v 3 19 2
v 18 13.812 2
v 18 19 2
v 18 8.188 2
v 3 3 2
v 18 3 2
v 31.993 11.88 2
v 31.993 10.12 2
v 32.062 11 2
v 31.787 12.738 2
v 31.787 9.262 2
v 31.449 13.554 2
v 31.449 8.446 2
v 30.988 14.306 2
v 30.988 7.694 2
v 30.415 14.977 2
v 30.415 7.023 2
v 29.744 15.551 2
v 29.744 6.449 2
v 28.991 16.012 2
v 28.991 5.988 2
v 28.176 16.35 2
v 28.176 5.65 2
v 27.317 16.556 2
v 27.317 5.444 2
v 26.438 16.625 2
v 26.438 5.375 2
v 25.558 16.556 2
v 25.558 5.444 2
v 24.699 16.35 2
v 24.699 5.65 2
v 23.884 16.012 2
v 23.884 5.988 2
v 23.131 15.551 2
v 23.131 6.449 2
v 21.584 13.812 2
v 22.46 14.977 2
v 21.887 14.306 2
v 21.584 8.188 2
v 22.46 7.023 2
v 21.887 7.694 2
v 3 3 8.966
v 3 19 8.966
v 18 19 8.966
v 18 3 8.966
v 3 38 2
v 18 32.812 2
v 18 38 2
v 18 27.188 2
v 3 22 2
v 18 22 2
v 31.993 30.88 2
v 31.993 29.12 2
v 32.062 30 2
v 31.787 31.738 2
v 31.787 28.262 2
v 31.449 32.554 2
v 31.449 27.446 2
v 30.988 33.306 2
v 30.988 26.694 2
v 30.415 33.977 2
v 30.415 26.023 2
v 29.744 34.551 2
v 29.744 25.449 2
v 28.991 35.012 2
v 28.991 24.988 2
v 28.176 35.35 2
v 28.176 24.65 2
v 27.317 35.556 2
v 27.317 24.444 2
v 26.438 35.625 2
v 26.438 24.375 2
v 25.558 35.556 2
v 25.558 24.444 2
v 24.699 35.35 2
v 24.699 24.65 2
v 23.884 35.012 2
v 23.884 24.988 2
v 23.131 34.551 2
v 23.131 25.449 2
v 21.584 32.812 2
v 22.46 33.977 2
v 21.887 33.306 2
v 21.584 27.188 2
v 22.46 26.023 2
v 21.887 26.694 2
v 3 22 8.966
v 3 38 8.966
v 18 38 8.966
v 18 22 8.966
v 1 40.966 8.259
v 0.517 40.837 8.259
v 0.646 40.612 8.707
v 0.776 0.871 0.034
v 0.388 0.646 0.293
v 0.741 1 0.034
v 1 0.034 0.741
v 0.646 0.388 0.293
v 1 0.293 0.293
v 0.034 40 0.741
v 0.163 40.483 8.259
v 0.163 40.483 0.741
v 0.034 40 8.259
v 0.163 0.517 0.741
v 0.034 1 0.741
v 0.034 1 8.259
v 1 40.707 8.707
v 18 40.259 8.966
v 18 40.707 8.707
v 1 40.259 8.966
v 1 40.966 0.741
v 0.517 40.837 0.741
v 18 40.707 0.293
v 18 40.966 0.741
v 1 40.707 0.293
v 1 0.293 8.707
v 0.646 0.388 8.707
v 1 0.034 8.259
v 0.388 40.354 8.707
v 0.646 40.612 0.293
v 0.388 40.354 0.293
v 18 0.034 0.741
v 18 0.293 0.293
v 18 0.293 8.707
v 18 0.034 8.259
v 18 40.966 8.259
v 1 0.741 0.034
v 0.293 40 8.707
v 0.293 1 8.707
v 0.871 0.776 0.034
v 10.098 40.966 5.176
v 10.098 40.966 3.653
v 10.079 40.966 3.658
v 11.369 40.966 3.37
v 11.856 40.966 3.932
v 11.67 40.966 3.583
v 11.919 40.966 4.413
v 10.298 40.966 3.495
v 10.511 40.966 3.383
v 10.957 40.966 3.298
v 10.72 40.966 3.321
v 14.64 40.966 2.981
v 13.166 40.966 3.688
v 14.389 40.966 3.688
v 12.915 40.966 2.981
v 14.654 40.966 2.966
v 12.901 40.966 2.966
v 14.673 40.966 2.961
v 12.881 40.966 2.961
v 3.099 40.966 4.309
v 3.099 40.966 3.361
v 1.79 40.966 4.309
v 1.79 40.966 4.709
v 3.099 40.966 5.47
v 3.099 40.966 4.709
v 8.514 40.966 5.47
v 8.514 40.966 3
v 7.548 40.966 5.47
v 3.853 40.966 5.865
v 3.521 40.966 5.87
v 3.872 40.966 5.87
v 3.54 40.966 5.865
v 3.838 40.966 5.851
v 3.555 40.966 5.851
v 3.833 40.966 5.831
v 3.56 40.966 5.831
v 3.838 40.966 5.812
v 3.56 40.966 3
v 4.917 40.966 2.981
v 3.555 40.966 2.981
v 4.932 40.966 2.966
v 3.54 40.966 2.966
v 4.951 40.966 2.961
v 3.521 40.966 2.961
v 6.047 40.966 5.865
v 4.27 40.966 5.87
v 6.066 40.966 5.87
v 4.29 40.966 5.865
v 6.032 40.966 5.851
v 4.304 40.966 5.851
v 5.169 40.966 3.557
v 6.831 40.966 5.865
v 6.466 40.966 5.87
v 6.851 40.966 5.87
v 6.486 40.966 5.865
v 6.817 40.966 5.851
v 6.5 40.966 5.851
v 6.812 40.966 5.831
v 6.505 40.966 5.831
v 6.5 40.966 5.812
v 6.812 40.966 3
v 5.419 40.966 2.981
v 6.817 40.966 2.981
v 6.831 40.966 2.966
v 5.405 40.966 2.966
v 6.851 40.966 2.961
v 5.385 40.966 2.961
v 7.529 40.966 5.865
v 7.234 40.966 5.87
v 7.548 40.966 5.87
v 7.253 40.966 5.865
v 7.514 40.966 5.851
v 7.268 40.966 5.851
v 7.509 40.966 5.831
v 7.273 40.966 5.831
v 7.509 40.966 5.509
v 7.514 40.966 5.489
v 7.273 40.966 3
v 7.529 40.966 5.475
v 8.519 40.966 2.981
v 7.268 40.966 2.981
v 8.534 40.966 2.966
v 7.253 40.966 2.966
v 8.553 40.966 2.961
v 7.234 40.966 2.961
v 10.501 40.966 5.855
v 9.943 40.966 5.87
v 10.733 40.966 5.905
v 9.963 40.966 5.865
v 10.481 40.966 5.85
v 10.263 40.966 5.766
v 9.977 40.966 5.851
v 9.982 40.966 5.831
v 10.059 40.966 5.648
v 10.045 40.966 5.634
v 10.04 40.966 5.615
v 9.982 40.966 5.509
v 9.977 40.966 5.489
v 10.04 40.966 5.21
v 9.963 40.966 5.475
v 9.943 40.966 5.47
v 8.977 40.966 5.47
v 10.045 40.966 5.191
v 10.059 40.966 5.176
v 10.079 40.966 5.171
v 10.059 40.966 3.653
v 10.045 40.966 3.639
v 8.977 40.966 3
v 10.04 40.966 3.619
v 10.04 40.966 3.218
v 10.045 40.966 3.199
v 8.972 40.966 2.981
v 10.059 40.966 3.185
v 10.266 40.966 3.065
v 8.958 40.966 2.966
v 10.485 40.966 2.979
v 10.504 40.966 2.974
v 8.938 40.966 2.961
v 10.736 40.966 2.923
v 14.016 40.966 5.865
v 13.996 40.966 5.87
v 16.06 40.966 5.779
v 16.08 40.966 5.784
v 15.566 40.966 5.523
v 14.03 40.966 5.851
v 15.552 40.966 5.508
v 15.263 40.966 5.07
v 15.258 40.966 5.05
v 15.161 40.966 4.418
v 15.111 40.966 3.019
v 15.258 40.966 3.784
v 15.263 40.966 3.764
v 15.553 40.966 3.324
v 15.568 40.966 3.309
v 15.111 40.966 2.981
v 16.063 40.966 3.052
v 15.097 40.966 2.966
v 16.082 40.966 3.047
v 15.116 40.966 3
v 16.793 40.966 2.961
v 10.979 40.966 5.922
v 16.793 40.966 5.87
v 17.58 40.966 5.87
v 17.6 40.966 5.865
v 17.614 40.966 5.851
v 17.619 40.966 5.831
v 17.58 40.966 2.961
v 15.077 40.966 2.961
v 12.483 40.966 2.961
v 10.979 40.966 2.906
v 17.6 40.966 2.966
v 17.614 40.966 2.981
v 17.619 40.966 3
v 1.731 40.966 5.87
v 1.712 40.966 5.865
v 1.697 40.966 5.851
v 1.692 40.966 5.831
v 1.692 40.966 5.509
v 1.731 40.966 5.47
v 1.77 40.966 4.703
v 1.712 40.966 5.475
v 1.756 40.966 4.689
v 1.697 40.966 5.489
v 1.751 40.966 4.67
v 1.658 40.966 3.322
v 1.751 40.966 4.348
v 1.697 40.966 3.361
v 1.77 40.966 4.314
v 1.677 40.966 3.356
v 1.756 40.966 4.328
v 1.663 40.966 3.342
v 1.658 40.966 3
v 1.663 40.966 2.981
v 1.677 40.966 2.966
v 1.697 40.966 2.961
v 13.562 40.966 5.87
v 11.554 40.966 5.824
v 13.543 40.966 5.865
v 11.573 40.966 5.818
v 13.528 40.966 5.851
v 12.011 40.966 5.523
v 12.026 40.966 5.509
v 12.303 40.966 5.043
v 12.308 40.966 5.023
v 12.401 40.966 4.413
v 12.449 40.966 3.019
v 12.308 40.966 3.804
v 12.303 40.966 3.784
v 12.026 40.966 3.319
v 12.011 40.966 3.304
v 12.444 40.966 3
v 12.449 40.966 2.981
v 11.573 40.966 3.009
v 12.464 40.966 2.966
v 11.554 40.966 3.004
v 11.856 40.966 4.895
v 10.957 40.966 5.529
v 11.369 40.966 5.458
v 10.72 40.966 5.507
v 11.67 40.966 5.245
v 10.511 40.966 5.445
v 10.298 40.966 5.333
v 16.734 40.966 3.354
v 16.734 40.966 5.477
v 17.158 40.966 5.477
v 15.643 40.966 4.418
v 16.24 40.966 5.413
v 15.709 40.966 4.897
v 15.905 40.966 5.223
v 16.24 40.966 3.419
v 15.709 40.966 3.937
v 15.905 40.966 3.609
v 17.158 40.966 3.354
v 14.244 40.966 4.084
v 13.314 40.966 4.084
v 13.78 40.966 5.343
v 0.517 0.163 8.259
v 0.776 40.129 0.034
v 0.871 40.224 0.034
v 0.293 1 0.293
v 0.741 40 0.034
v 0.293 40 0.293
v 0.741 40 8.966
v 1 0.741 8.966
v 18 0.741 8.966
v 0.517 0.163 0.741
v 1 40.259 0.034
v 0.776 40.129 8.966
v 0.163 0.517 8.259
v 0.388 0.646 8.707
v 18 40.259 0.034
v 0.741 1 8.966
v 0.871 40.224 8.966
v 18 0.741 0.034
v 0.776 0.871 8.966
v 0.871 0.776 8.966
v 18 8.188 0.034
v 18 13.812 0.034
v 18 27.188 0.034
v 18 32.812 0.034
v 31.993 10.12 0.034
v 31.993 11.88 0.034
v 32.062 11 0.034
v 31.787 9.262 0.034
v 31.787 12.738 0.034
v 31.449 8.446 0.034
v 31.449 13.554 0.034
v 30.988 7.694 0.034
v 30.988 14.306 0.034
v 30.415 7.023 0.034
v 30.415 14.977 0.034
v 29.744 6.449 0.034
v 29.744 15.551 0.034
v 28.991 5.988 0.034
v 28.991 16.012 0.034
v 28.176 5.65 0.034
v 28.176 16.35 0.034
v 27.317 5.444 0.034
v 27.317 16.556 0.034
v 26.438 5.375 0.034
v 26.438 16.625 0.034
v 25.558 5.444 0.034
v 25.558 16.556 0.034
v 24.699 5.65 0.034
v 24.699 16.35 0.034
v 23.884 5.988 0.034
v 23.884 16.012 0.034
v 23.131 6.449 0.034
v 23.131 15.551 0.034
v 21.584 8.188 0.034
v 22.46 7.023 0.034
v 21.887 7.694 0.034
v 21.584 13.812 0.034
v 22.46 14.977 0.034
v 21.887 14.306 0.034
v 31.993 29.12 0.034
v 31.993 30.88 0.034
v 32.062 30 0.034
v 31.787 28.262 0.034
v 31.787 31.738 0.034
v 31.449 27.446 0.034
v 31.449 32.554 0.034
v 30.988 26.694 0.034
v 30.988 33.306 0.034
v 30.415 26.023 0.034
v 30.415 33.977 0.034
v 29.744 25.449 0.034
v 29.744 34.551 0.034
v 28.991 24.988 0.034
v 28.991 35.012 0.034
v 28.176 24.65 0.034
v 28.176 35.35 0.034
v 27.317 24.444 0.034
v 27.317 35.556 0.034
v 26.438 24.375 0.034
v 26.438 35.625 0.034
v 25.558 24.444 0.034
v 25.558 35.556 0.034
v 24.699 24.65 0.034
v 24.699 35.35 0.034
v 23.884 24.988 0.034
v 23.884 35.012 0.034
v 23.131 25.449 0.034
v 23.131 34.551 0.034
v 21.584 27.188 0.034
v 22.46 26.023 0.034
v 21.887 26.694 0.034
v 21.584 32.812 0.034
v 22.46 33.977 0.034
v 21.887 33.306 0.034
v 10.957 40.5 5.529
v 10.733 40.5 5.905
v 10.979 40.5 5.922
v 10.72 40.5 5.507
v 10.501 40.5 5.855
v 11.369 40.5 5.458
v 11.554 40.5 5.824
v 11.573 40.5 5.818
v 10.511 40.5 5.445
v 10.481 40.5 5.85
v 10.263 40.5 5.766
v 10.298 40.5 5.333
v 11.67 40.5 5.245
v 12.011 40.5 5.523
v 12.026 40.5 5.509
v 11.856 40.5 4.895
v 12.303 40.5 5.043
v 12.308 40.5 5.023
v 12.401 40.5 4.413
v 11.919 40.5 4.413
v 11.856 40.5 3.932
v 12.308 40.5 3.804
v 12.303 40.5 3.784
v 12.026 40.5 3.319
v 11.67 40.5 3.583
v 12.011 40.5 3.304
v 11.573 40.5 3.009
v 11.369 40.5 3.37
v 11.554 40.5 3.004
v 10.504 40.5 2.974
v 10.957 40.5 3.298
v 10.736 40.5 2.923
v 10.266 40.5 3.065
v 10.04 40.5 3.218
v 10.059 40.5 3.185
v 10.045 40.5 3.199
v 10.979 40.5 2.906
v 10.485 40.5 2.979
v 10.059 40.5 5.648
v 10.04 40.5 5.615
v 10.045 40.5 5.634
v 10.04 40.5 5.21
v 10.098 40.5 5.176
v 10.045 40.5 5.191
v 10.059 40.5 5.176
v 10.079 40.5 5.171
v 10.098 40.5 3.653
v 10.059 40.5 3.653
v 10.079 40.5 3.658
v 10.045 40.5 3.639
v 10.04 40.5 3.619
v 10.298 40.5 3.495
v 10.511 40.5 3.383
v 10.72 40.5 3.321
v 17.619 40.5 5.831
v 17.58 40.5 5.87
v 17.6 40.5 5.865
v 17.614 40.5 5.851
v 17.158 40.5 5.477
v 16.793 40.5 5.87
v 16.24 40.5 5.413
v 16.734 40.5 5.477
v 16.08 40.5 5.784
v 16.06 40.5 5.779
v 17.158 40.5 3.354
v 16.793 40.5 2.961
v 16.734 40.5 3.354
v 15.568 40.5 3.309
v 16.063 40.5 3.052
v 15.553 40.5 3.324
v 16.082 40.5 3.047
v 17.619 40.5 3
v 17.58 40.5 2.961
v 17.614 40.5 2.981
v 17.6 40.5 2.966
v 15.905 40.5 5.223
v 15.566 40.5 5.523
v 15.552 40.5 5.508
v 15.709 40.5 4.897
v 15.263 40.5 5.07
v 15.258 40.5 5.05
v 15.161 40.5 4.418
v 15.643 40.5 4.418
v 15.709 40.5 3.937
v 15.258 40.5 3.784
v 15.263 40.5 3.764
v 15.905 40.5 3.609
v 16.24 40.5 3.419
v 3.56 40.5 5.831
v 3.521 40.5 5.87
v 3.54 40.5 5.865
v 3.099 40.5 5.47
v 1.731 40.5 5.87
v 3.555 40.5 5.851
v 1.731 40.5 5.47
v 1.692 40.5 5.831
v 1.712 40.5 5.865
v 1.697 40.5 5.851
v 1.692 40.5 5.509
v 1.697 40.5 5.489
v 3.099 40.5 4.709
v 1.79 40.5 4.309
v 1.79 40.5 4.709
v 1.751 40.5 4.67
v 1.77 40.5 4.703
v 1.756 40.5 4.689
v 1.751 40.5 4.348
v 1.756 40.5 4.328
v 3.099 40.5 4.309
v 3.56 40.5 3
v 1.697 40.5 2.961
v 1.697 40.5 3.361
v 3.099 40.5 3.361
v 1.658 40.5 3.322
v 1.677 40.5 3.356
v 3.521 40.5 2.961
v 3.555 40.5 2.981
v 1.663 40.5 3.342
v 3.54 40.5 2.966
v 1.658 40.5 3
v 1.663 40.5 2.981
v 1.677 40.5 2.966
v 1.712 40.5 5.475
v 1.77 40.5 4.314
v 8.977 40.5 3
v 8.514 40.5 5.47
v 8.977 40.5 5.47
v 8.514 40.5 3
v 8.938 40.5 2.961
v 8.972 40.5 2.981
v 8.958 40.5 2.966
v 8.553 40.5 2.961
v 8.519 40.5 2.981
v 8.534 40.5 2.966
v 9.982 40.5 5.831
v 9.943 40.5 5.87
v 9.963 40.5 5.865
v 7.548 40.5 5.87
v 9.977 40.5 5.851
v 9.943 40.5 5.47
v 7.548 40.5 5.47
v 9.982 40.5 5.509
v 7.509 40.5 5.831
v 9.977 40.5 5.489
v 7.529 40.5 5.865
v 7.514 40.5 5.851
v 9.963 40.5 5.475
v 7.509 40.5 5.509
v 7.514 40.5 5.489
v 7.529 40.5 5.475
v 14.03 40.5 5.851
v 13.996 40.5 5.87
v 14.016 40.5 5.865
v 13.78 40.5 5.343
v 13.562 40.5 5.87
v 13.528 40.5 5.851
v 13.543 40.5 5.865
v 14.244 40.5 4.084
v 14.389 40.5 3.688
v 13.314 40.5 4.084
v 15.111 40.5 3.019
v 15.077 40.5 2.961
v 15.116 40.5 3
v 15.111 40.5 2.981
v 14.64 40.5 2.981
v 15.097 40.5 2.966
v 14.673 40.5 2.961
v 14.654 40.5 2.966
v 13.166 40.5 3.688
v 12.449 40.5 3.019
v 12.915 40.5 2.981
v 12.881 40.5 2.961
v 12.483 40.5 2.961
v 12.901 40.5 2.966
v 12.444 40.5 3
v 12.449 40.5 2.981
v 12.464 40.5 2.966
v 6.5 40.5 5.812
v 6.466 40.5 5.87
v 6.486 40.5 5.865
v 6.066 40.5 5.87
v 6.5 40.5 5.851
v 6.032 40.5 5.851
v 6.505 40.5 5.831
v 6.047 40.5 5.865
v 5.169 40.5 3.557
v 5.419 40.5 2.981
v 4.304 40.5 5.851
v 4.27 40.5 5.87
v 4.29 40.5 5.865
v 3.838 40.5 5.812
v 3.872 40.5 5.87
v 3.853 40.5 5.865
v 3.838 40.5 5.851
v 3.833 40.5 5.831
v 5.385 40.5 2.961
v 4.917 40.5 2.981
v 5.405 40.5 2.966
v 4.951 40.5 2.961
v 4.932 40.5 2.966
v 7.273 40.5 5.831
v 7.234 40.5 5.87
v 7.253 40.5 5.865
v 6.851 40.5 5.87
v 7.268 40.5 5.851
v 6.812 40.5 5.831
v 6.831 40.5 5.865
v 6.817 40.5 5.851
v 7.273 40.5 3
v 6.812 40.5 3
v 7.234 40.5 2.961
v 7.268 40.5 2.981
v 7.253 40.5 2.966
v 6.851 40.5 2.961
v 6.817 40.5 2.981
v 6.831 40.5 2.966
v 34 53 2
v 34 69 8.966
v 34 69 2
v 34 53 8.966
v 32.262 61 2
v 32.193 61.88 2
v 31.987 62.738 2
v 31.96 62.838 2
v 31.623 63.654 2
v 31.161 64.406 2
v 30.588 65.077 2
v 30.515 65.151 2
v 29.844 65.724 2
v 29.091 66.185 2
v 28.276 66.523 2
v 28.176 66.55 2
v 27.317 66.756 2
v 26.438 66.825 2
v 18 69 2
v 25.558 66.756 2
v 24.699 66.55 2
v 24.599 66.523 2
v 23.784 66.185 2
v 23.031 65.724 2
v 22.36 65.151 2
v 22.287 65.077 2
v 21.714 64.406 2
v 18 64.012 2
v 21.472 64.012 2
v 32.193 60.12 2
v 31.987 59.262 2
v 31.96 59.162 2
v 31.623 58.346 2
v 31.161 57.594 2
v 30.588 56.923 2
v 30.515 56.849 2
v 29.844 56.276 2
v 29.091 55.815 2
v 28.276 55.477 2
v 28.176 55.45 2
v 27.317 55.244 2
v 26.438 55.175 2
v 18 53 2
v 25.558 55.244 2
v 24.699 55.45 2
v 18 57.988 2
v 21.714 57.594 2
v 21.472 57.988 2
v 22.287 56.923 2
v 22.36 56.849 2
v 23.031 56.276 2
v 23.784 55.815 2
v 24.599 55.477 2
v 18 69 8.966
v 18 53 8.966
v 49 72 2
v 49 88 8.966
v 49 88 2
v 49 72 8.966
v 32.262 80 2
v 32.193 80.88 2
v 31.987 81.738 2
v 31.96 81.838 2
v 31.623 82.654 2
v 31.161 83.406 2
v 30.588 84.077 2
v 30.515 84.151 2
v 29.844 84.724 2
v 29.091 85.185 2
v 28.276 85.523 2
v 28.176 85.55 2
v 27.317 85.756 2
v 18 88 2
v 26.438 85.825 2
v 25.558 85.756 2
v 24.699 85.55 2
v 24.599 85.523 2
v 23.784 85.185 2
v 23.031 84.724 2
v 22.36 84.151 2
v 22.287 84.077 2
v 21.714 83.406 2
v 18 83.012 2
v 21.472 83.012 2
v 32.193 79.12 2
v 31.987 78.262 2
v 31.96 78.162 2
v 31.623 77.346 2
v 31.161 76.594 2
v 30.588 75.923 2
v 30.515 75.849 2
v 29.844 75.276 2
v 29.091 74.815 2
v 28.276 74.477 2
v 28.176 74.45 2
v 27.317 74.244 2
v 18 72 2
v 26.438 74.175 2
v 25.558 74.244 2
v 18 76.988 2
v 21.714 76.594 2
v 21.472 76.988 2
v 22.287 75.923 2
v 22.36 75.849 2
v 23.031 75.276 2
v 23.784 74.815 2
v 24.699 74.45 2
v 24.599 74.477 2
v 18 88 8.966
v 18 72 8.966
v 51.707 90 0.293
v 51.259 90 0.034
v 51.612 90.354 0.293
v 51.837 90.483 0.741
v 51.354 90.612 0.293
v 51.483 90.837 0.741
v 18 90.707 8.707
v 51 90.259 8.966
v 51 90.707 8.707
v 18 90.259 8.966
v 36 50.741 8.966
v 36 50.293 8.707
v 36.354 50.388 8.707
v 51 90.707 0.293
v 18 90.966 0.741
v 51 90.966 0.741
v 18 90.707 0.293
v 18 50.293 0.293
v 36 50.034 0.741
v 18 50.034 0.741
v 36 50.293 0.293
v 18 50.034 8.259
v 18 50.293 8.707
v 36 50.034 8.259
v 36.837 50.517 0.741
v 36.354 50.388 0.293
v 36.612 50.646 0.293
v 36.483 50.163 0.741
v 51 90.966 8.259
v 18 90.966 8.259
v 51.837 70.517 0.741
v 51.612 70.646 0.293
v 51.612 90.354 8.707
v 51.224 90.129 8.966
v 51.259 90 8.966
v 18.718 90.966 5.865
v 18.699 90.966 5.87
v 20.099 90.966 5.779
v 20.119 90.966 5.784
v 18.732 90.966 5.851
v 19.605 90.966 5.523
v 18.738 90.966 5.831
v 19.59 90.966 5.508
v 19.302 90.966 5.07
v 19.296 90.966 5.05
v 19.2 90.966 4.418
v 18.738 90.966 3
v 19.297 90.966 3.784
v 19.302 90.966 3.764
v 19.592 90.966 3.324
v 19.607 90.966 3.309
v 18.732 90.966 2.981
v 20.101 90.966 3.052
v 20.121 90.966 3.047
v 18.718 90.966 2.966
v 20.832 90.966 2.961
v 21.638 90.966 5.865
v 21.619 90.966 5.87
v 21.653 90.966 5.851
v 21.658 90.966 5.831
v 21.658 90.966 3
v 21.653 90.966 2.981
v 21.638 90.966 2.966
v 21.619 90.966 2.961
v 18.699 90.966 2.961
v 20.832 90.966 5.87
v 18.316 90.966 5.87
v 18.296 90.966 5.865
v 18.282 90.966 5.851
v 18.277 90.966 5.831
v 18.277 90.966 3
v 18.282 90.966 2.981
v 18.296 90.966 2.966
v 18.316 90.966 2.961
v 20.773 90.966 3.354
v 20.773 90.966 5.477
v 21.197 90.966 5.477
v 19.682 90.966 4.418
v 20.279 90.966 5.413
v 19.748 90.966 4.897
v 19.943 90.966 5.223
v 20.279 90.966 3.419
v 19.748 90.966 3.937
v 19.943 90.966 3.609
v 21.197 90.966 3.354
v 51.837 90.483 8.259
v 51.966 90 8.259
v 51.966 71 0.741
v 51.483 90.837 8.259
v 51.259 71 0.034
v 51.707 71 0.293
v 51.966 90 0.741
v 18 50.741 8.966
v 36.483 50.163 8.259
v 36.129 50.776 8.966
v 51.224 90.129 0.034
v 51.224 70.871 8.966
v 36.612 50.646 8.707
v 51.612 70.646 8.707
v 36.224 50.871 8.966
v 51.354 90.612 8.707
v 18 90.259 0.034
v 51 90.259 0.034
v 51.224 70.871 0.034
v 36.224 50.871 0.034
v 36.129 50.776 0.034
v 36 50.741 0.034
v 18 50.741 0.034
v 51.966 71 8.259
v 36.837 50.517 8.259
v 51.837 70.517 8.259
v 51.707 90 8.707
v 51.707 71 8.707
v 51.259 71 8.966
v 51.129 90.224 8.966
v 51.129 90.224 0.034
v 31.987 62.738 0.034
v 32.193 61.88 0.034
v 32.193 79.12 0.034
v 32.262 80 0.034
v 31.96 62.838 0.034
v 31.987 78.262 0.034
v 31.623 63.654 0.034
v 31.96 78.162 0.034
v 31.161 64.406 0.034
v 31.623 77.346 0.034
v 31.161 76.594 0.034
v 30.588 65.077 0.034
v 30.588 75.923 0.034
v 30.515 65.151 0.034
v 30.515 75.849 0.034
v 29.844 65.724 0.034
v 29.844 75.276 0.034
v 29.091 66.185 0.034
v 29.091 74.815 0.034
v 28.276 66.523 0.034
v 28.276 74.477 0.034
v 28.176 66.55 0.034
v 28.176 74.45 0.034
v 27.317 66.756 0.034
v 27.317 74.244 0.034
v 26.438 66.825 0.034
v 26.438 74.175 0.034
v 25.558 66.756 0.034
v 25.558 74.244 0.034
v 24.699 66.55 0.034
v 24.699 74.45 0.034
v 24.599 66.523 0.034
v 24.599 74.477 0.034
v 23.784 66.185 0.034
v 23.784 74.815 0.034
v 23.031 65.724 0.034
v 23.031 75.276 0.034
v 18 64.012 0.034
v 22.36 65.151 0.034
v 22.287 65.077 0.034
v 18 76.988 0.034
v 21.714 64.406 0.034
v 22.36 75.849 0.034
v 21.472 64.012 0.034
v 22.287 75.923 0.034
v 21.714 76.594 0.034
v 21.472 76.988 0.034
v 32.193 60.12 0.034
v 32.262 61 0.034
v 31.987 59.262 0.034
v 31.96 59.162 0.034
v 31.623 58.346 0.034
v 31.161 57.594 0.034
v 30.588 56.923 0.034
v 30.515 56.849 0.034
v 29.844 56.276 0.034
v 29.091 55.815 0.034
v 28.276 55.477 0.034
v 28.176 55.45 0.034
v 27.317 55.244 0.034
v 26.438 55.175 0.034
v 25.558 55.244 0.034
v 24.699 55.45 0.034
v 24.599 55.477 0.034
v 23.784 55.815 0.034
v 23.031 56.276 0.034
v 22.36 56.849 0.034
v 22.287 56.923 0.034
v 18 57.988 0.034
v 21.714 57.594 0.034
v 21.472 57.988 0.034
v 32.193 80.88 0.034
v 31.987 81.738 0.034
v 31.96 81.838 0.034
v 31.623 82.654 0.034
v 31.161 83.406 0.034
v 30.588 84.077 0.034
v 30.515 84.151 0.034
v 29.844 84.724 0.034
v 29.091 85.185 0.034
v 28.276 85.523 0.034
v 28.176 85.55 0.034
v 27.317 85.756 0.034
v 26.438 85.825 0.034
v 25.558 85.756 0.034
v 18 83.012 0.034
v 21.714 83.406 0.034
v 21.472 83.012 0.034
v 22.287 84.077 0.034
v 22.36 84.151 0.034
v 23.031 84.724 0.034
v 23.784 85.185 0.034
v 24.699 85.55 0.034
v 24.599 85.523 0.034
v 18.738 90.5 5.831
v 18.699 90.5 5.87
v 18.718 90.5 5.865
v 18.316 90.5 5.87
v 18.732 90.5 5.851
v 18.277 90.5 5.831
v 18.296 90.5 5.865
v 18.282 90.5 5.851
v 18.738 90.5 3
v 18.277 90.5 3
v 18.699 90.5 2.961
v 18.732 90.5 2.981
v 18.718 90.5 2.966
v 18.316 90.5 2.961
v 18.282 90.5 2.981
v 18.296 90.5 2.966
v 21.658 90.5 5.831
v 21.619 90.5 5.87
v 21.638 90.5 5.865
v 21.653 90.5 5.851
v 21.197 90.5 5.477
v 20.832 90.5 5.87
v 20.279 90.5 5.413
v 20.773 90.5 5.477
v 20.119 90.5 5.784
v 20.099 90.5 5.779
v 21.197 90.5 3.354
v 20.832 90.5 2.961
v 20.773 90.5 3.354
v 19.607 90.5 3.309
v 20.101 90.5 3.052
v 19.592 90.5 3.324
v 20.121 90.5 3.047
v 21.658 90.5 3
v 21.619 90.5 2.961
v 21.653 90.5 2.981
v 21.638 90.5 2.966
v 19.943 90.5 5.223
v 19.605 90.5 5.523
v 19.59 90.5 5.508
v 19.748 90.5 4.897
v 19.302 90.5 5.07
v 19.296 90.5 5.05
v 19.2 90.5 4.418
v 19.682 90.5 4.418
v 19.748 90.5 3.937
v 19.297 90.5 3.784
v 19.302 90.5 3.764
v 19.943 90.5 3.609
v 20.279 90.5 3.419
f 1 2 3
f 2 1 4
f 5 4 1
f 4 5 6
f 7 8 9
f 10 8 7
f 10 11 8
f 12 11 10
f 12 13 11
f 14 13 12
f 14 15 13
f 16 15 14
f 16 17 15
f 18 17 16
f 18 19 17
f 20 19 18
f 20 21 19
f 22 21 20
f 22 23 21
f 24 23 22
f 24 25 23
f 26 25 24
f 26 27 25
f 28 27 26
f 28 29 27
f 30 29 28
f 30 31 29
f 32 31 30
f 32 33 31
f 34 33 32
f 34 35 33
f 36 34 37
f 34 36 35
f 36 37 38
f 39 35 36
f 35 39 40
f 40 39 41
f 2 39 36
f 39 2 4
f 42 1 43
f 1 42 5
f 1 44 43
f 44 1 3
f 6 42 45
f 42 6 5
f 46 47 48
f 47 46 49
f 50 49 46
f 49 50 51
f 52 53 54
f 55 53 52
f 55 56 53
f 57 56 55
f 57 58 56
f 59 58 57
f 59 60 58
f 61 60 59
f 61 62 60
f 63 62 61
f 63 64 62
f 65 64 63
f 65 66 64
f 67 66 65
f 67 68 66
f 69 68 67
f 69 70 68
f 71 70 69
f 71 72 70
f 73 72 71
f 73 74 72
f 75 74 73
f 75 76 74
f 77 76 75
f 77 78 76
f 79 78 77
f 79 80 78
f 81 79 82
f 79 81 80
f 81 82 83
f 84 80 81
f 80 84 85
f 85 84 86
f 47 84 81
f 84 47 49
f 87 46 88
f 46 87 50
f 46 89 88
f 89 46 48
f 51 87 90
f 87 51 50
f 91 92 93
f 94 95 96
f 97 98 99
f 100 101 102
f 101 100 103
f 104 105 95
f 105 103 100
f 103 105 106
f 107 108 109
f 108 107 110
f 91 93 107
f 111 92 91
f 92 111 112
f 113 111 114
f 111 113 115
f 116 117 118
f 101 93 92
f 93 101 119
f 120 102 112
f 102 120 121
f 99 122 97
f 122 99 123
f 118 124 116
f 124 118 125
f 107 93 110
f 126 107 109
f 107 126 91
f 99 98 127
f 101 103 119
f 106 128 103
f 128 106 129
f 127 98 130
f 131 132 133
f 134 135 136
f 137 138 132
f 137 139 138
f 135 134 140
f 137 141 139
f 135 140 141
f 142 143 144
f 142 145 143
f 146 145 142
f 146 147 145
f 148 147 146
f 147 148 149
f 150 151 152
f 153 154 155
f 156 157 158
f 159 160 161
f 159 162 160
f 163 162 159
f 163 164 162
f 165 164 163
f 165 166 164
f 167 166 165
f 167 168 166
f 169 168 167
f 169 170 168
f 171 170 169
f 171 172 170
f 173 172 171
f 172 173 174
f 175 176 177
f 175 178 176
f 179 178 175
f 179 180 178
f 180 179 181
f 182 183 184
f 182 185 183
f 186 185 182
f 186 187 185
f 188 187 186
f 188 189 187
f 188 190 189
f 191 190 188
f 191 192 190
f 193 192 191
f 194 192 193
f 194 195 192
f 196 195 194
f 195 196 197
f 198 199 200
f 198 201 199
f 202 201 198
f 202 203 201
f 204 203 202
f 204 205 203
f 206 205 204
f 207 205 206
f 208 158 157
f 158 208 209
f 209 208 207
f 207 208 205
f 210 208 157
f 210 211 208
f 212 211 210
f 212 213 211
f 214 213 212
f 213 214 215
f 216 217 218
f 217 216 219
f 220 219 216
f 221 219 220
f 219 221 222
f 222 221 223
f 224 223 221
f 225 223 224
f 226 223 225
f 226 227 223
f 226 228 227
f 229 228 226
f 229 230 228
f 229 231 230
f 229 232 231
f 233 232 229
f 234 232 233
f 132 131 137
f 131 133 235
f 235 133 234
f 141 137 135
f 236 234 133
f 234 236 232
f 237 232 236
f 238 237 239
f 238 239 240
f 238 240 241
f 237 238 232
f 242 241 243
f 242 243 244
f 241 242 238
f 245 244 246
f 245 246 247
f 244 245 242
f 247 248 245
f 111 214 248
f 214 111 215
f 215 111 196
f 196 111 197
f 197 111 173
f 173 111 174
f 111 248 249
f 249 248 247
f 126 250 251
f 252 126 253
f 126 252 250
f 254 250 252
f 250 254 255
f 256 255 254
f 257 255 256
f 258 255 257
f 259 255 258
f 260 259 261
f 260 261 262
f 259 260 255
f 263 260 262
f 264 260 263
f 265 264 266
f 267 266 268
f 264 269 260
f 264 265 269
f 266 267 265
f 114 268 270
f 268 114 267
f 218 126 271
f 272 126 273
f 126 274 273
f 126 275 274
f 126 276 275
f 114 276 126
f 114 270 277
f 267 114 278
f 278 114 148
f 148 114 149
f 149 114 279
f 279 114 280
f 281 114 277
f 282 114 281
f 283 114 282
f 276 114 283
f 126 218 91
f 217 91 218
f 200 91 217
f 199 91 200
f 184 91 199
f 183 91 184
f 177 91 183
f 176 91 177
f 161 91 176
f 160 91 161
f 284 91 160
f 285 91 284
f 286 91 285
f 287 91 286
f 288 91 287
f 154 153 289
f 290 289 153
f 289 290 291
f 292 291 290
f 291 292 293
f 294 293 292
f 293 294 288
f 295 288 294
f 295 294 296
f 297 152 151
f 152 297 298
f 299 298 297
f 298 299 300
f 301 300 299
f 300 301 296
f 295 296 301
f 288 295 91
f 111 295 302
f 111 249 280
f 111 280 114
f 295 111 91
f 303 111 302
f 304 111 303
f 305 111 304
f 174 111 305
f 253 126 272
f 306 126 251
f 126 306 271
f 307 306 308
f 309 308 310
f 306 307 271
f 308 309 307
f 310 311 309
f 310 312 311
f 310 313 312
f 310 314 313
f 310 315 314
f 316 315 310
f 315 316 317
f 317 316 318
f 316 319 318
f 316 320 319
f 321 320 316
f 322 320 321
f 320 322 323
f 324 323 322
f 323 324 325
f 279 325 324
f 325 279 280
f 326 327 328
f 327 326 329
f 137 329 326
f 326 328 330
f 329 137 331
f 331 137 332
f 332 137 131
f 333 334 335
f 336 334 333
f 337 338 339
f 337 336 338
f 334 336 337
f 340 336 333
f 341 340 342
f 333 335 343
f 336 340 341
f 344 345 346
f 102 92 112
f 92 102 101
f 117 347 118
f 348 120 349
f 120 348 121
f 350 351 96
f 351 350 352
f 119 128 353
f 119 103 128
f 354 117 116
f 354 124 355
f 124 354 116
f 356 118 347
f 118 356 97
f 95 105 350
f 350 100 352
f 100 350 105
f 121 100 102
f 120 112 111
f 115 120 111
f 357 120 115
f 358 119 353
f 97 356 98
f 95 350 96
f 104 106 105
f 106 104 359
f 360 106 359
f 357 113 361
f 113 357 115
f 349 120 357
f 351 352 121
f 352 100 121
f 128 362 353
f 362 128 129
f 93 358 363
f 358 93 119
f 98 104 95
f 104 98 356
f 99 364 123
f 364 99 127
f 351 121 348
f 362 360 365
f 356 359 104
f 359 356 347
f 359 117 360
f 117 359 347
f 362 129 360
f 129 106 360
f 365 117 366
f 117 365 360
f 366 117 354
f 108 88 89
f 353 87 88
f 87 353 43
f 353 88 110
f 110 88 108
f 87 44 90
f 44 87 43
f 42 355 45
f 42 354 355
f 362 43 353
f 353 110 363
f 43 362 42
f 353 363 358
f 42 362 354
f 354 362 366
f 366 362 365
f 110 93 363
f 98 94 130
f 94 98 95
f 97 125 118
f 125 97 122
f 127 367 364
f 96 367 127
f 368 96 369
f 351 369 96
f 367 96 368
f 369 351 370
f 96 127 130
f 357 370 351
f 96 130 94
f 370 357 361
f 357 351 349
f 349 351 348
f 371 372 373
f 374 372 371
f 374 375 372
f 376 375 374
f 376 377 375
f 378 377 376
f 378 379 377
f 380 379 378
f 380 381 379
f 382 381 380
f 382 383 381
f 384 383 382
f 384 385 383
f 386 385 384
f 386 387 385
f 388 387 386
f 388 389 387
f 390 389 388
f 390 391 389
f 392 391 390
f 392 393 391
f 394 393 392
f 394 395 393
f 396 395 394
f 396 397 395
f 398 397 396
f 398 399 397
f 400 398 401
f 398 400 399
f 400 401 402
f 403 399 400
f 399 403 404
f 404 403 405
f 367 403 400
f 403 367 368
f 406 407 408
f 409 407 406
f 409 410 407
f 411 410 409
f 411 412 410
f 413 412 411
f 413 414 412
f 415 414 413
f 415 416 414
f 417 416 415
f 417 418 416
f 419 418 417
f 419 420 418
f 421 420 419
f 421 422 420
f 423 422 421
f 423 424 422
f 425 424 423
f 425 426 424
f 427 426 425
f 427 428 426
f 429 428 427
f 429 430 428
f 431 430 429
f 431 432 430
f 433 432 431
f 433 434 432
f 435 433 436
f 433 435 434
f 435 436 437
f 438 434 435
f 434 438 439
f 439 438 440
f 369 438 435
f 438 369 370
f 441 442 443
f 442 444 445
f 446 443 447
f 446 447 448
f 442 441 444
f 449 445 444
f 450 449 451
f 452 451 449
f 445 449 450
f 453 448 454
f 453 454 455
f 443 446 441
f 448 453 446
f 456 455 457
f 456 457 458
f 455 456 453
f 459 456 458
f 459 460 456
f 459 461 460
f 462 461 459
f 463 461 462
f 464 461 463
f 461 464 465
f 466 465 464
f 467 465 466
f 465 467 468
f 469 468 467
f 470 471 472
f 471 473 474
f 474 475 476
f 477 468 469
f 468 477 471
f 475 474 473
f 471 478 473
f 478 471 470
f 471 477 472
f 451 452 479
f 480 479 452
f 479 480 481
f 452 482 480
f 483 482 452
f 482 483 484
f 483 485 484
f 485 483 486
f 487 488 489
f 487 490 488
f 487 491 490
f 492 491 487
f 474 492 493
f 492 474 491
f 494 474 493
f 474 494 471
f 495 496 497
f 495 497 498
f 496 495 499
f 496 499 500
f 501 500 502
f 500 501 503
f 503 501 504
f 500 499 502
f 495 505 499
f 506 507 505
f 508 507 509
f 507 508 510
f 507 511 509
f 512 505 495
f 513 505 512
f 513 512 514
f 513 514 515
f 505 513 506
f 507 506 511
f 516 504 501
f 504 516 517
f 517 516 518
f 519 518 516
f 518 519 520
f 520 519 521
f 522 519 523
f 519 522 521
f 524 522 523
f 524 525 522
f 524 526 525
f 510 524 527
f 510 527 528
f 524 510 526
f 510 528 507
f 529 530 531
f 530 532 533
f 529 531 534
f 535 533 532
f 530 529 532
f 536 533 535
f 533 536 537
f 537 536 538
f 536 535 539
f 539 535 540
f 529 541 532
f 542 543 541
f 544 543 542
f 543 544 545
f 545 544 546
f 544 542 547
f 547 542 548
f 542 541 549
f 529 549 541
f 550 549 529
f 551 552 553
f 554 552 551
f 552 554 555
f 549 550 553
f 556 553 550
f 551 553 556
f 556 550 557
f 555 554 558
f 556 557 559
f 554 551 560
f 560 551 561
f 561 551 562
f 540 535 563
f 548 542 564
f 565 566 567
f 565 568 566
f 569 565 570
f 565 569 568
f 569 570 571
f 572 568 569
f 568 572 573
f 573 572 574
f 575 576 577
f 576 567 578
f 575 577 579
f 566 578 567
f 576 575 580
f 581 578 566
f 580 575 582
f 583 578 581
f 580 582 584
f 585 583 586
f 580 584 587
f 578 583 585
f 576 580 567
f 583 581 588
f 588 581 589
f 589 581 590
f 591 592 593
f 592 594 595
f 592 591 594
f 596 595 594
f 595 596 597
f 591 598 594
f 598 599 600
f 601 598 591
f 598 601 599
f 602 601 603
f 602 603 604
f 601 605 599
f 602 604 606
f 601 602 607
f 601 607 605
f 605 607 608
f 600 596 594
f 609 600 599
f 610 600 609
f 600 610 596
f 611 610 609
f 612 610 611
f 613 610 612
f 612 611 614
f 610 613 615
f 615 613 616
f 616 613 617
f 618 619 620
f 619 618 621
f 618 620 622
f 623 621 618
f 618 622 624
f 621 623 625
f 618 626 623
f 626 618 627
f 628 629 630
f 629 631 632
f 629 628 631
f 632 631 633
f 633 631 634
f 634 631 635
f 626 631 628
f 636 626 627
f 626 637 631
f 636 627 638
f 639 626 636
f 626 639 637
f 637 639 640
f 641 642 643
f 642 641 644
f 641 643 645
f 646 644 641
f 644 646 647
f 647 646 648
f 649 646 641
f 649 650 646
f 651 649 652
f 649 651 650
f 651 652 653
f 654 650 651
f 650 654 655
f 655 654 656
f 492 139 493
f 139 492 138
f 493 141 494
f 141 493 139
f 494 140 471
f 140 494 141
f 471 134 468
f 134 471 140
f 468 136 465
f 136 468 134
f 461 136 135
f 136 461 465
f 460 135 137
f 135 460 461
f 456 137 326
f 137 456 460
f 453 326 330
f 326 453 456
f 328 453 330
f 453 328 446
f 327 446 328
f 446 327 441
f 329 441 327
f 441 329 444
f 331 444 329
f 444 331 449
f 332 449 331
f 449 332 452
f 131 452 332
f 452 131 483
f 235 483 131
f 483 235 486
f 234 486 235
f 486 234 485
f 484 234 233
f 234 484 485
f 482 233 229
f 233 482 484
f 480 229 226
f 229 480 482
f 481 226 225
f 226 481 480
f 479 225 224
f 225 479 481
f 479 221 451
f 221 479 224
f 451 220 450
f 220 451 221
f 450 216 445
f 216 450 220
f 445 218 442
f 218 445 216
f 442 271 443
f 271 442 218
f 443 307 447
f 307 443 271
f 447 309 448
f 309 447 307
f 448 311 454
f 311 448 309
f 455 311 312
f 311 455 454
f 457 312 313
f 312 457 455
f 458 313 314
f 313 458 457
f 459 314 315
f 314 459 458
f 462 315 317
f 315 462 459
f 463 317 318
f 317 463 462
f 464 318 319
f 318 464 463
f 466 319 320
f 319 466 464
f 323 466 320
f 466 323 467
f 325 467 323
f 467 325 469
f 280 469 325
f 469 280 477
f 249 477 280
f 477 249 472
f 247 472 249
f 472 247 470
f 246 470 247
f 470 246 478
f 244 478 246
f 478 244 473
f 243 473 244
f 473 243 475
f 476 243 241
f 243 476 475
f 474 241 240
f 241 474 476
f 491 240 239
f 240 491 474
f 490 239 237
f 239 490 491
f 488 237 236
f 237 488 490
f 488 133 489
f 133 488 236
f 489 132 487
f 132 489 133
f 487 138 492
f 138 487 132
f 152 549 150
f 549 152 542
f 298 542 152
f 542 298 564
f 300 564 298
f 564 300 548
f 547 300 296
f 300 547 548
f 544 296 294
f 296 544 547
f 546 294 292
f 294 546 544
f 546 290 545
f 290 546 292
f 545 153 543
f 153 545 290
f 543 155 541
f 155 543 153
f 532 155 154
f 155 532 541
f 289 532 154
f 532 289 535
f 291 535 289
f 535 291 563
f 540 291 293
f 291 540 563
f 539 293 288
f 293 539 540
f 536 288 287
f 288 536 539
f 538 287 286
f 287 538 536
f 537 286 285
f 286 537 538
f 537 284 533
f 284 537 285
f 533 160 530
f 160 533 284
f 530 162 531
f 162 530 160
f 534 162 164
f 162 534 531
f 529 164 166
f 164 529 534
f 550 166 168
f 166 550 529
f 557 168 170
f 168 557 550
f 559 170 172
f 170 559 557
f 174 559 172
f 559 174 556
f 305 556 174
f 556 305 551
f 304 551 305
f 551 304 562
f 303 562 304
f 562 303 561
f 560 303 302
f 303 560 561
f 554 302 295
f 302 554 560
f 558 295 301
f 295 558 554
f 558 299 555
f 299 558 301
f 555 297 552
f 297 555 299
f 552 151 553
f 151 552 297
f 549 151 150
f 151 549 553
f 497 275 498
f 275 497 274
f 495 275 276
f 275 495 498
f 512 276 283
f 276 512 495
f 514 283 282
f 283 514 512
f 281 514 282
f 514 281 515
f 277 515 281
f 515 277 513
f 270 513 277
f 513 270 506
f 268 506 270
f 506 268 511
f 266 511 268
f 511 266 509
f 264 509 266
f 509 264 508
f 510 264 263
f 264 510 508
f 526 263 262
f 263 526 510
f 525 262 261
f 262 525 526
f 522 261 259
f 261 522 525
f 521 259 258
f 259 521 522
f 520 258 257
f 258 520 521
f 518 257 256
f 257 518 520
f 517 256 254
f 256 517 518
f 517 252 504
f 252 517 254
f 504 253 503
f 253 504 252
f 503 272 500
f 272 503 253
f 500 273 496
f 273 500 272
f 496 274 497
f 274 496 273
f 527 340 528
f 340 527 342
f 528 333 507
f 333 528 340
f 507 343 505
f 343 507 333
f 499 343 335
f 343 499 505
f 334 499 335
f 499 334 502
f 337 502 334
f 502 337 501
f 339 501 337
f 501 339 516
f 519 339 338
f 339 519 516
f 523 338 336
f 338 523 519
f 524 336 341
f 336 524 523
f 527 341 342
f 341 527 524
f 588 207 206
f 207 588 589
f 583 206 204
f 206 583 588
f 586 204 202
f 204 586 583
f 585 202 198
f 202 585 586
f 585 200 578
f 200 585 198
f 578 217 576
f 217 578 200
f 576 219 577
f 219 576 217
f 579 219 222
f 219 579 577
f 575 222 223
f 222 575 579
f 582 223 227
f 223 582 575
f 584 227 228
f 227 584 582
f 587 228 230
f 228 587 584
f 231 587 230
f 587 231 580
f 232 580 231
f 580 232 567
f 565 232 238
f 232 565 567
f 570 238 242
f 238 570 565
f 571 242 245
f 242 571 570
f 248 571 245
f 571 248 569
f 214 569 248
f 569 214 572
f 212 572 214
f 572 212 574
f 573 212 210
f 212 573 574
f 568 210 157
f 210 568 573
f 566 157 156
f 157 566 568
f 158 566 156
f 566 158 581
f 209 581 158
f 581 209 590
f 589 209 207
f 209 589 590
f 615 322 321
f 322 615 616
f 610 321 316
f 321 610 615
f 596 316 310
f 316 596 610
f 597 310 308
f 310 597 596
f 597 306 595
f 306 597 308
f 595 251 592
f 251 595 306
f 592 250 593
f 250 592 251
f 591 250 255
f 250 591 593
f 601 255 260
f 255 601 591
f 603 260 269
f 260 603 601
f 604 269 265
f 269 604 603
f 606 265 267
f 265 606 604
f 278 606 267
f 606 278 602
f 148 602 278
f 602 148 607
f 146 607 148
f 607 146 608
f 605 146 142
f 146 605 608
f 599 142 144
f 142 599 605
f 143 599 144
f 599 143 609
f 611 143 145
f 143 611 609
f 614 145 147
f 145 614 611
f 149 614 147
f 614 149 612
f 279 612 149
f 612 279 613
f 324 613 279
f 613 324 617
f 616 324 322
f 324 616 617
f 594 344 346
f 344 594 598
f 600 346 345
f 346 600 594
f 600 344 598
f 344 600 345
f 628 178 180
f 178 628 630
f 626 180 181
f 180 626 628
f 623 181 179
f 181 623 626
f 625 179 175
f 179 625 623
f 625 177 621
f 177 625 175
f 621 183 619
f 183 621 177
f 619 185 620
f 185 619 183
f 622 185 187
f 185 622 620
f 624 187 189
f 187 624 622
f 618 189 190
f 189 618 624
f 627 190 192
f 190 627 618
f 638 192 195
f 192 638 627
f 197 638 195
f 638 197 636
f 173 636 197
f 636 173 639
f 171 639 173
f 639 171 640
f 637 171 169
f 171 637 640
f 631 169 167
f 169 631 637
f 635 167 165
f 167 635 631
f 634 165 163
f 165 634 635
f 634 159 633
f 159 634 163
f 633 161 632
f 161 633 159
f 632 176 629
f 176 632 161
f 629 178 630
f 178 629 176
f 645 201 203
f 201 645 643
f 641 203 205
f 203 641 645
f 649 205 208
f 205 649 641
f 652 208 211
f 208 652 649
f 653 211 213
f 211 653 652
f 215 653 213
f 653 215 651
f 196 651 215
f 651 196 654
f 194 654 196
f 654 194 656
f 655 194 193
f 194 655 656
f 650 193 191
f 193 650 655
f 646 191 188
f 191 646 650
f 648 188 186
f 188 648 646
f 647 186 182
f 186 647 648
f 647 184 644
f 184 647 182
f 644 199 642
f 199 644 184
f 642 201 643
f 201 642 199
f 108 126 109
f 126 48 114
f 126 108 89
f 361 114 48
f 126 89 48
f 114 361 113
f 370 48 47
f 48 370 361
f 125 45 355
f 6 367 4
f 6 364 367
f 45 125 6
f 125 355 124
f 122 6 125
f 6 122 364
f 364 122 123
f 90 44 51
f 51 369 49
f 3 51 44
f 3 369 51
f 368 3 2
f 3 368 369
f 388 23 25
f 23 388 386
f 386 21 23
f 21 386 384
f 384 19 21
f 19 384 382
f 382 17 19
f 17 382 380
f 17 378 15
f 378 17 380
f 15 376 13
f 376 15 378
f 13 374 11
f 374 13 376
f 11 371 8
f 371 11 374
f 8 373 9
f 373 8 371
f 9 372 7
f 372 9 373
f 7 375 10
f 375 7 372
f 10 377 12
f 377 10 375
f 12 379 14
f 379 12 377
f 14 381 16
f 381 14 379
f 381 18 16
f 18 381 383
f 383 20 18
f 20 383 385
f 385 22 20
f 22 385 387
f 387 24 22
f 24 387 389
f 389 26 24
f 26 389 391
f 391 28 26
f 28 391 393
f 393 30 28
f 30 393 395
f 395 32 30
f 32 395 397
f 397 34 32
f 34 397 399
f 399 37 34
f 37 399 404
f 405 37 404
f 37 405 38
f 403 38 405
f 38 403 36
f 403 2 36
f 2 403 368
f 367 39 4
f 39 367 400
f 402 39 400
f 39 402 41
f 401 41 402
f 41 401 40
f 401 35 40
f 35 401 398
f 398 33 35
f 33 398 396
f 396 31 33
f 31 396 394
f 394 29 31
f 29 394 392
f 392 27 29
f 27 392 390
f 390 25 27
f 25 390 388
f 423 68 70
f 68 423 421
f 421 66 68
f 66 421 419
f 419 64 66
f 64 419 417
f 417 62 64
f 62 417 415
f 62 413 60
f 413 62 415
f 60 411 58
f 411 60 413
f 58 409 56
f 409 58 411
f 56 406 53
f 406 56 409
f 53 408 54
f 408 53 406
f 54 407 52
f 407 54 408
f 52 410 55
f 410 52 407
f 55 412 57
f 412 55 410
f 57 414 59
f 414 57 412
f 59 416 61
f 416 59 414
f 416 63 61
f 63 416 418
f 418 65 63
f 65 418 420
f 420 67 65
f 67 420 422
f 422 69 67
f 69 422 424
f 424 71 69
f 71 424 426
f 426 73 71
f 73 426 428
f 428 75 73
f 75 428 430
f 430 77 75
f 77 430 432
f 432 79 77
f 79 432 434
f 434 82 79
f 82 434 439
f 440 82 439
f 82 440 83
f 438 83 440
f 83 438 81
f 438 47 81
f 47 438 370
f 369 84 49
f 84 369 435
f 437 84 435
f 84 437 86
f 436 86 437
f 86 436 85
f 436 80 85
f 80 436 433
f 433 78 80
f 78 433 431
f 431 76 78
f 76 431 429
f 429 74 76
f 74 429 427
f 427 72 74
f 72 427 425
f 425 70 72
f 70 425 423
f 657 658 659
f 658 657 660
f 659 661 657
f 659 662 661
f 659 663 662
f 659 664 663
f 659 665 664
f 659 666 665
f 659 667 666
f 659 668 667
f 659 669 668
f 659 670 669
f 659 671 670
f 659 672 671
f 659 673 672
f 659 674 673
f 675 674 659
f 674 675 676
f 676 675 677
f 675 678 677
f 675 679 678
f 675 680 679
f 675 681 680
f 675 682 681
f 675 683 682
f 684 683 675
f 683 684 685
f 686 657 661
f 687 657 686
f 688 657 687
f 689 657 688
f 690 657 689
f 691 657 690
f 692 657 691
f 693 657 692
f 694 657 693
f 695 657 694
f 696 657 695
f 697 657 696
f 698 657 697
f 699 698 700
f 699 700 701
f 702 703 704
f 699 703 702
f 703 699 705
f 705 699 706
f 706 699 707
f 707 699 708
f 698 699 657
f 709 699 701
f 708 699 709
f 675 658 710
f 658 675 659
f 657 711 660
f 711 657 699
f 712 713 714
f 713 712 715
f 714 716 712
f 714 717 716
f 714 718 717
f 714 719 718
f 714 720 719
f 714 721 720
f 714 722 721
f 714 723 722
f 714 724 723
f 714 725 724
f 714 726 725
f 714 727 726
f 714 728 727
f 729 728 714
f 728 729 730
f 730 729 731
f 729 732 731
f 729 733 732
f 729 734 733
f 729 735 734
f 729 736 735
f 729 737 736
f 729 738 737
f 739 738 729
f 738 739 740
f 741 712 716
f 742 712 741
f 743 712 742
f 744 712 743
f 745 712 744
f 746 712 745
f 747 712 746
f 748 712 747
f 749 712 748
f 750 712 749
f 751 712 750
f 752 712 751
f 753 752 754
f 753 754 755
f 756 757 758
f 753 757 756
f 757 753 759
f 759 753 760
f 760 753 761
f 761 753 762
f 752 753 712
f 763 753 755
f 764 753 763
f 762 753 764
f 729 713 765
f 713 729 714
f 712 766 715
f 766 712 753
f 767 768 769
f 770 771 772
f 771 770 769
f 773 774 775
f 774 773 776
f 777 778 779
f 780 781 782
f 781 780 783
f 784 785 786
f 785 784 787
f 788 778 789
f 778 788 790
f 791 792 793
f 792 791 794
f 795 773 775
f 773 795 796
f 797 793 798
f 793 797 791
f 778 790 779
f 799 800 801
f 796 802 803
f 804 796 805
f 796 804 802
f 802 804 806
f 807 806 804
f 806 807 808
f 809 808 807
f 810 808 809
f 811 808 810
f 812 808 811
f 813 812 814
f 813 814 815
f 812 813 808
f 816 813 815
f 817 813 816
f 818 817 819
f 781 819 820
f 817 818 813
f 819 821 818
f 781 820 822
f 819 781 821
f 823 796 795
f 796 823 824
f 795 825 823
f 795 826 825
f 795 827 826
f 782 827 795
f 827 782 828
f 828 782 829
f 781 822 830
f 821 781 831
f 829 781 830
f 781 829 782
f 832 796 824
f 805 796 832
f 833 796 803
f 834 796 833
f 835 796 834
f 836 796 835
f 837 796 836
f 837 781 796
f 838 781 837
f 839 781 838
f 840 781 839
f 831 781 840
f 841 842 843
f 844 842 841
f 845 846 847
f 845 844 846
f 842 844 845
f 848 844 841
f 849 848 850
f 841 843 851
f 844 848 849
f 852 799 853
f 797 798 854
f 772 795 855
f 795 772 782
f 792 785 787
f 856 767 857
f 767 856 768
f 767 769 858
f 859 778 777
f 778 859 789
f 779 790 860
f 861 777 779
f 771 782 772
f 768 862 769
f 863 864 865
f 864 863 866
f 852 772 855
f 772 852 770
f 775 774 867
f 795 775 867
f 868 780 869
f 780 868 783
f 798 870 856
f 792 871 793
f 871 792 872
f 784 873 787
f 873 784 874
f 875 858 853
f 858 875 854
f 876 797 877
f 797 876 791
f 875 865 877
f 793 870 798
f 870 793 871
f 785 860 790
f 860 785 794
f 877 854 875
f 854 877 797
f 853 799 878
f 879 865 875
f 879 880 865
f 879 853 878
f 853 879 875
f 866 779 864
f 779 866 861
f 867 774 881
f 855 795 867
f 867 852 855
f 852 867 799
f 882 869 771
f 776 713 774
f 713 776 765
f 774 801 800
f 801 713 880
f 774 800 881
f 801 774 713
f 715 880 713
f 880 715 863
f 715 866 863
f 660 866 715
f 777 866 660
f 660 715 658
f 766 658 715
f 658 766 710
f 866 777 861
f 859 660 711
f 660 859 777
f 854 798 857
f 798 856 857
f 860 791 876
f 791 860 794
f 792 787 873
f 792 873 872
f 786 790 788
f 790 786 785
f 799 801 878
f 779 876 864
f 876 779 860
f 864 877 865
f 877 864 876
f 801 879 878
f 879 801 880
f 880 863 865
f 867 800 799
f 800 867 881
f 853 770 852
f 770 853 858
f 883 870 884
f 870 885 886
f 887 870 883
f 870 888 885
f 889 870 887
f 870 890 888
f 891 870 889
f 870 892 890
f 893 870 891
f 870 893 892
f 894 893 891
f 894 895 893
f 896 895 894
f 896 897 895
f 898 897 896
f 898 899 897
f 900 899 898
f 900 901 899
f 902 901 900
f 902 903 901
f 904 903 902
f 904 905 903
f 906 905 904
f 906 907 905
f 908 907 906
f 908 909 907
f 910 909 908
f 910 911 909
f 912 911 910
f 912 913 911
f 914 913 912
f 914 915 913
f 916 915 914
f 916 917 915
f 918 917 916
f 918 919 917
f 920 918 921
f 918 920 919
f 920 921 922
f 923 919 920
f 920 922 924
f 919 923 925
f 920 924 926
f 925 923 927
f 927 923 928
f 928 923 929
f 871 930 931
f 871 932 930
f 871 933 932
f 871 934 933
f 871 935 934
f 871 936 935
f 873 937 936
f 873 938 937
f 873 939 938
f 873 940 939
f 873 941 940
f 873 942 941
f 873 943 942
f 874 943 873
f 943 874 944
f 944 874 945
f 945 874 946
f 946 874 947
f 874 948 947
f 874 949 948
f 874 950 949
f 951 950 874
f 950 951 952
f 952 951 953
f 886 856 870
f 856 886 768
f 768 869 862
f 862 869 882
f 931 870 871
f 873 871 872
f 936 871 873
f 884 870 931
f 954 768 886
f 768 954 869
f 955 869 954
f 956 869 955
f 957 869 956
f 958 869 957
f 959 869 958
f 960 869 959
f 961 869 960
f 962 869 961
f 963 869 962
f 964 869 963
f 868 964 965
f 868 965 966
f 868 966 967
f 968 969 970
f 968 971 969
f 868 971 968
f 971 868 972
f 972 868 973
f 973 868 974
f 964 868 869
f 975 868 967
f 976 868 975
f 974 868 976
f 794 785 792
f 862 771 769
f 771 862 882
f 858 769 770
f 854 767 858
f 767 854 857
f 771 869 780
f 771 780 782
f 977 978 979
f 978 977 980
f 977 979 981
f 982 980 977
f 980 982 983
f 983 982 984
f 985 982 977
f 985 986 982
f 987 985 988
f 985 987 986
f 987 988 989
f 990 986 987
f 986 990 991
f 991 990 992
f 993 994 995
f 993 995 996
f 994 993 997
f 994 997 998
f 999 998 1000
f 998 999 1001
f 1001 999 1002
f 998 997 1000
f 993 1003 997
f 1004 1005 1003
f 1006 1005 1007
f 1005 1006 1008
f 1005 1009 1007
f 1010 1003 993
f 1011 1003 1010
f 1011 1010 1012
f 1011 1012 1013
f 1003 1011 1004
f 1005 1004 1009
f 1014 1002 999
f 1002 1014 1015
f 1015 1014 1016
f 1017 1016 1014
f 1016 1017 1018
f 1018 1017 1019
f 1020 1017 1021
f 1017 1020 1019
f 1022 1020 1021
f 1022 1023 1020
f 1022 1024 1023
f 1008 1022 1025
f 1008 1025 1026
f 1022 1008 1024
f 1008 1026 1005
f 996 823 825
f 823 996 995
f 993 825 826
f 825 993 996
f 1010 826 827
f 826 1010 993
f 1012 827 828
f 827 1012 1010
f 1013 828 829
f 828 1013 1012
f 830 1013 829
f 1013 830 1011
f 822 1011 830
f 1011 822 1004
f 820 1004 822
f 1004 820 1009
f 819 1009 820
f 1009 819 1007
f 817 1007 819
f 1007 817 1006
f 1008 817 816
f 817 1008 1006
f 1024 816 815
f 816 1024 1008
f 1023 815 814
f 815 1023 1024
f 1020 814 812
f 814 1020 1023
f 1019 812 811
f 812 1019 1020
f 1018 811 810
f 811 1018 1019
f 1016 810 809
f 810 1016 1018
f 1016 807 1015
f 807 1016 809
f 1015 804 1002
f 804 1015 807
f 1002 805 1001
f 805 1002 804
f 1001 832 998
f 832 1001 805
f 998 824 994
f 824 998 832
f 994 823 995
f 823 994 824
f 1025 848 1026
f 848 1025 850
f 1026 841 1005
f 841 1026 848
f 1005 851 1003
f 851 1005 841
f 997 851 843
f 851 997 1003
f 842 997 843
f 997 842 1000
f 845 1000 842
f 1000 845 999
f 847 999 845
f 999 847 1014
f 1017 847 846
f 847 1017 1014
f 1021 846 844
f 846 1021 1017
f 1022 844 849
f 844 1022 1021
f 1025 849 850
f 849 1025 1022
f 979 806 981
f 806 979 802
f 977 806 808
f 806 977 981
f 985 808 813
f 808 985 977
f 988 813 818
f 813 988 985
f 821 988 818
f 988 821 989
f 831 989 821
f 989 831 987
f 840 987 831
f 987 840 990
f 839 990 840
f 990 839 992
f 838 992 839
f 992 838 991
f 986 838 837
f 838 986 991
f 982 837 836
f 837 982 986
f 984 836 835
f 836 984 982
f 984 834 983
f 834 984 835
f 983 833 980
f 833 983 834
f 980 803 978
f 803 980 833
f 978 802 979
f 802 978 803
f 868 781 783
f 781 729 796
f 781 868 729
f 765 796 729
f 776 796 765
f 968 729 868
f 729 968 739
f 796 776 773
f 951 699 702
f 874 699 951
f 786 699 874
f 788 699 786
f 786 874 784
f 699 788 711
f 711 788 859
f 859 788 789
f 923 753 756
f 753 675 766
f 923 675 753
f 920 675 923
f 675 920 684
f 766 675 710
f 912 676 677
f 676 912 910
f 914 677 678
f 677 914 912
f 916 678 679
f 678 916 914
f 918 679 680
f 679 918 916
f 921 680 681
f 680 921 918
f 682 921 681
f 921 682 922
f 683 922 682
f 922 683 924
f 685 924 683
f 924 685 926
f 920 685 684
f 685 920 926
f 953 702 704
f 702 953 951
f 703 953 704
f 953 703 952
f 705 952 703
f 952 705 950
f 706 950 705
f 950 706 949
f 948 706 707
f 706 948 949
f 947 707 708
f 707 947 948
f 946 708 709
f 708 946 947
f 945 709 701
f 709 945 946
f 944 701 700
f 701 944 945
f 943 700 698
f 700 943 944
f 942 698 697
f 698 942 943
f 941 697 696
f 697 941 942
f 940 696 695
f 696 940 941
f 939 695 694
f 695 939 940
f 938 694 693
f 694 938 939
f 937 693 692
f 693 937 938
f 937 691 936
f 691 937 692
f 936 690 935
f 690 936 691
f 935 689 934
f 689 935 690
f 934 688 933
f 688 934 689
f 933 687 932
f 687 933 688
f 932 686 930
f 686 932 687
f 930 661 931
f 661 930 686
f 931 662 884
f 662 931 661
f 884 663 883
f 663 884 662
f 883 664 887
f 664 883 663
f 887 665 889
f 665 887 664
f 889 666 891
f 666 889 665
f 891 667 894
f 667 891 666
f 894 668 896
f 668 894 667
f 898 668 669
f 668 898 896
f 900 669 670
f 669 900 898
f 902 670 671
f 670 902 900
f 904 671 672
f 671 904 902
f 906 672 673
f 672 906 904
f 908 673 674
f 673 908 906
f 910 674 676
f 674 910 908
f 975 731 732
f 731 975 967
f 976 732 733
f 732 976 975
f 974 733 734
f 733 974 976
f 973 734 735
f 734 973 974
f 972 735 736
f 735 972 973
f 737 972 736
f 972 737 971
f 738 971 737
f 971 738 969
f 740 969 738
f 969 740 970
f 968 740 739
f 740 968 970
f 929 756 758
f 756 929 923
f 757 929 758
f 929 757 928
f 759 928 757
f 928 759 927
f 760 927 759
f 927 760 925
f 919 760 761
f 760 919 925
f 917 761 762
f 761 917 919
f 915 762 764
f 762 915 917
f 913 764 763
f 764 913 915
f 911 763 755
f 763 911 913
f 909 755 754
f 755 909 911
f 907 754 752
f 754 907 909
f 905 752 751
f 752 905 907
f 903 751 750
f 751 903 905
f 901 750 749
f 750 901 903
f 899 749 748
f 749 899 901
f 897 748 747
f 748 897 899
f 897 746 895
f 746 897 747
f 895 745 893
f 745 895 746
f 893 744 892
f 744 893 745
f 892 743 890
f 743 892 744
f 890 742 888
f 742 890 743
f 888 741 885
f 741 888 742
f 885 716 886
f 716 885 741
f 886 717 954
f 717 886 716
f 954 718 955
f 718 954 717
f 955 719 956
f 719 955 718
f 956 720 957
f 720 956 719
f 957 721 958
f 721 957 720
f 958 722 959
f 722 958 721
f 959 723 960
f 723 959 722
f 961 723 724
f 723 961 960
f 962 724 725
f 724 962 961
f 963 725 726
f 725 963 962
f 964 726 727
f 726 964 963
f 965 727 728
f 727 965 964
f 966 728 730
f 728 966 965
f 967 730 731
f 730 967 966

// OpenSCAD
// file: logo.scad
module logo() {
	translate([-7, 68, 0]) logoText();
	logoShapes();
}

module logoText() {
	linear_extrude(height = 10) {
		minkowski() {
			text("DIDACTIVE", size=71.7, font="Century Gothic");
			circle(1);
		}
	}
}

module logoShapes() {
	step = 63;
	linear_extrude(height = 10) {
		translate([0*step, 0]) logoSquare();
		translate([1*step, 0]) logoCircle();
		translate([2*step, 0]) logoTriangle();
		translate([3*step, 0]) logoCircle();
		translate([4*step, 0]) logoSquare();
		translate([5*step, 0]) logoCircle();
		translate([6*step, 0]) logoTriangle();
		translate([7*step, 0]) logoCircle();
	}
}

module logoSquare() {
	difference() {
		square(52);
		translate([12, 12]) square(28);
	}
}

module logoCircle() {
	difference() {
		square(52);
		translate([26, 26]) circle(d=35);
	}
}

module logoTriangle() {
	a = 20;
	points = [[0, a], [-cos(30)*a, -sin(30)*a], [cos(30)*a, -sin(30)*a]];
	difference() {
		square(52);
		translate([26, 22]) polygon(points);
	}
}
// main file
$fn = 12;
include<logo.scad>

a = 15; // jednotková vzdálenost
startSize = 2; // nejmenší jednotka
endSize = 3; // největší jednotka
numCubes = endSize - startSize + 1; // počet jednotek

// hlavní deska
border = 3; // prostor kolem hranolku, respektive vzdálenost mezi nimi
boardHeight = 9; // plná tloušťka destičky
indentDepth = 7; // hloubka díry pro hranolek
puzzleEnlargement = 0.2; // rezerva puzzlíku

// horní část
freeSpace = 0; // meziprostor
numberedBlockHeight = 5; // výška hranolku s číslem
numberedBlockLength = 0; // délka hranolku s číslem
topIndentExtension = 0; // místo navíc na odebírání hranolku
textDepth = 1; // hloubka zářezu textu a mřížek


extraSpace = 0.5; // rezerva
roundness = 1; // zaoblení
logoDepth = 0.5; // hloubka loga
logoSize = 20; // velikost loga

chunkSize = a + border + 2*extraSpace;
boardSize = numCubes * chunkSize + border;
topSize = 0; //freeSpace + numberedBlockLength + 2*extraSpace + topIndentExtension + border;

module base() {
	translate([roundness - topSize, roundness, 0]) sphere(roundness);
	translate([chunkSize + (startSize-1) * a + border - roundness, roundness, 0]) sphere(roundness);
	translate([endSize*a + 2*border + 2*extraSpace - roundness, boardSize - chunkSize - roundness, 0]) sphere(roundness);
	translate([endSize*a + 2*border + 2*extraSpace - roundness, boardSize - roundness, 0]) sphere(roundness);
	translate([roundness - topSize, boardSize - roundness, 0]) sphere(roundness);
}

module chunk(size) {
	cube([a*size + 2*extraSpace, a + 2*extraSpace, indentDepth]);
}

module board() {
	difference() {
		hull() {
			translate([0, 0, roundness]) base();
			translate([0, 0, boardHeight - roundness]) base();	
		}
		// indents
		for (i = [0 : numCubes - 1]) {
			translate([border, border + i * chunkSize, boardHeight-indentDepth]) chunk(startSize + i);
		}
		// top indents
		for (i = [0 : numCubes - 1]) {
			translate([border - topSize, border + i * chunkSize, boardHeight-indentDepth])
			cube([numberedBlockLength + 2*extraSpace + topIndentExtension, a + 2*extraSpace, indentDepth]);
		}
	}
}

module roundedCuboid(size = [1, 1, 1], r = 1) {
	hull() {
		translate([r, r, r]) sphere(r);
		translate([r, size[1] - r, r]) sphere(r);
		translate([r, r, size[2] - r]) sphere(r);
		translate([r, size[1] - r, size[2] - r]) sphere(r);

		translate([size[0] - r, r, r]) sphere(r);
		translate([size[0] - r, size[1] - r, r]) sphere(r);
		translate([size[0] - r, r, size[2] - r]) sphere(r);
		translate([size[0] - r, size[1] - r, size[2] - r]) sphere(r);
	}
}

module finalShape() {
	// deska
	difference() {
		board();
		// logo
		translate([logoSize + 2, boardSize - logoDepth, (boardHeight - 0.15*logoSize) / 2])
		rotate([90, 0, 180]) resize([logoSize, 0, 1.01*logoDepth], auto=true) logoText();
	}
}

module puzzle(size, larger) {
	minkowski() {
		union() {
			square([size, size/2], center=true);
			translate([3/4*size, 0]) circle(d=size, $fn=40);
		}
		if (larger) {
			circle(puzzleEnlargement);
		}
	}
}

module splitter(larger) {
	translate([-100, -1, -1]) cube([100 + 0.4 * endSize * a, boardSize + 2, boardHeight + 2]);
	translate([0.4 * endSize * a, border + a/2 + extraSpace, -1])
	linear_extrude(boardHeight + 2) puzzle(0.75*a, larger);
	translate([0.4 * endSize * a, boardSize - border - a/2 - extraSpace, -1])
	linear_extrude(boardHeight + 2) puzzle(0.75*a, larger);
}


// část 1
intersection() {
	finalShape();
	splitter(false);
}

// část 2
translate([0, 50, 0]) difference() {
	finalShape();
	splitter(true);
}
